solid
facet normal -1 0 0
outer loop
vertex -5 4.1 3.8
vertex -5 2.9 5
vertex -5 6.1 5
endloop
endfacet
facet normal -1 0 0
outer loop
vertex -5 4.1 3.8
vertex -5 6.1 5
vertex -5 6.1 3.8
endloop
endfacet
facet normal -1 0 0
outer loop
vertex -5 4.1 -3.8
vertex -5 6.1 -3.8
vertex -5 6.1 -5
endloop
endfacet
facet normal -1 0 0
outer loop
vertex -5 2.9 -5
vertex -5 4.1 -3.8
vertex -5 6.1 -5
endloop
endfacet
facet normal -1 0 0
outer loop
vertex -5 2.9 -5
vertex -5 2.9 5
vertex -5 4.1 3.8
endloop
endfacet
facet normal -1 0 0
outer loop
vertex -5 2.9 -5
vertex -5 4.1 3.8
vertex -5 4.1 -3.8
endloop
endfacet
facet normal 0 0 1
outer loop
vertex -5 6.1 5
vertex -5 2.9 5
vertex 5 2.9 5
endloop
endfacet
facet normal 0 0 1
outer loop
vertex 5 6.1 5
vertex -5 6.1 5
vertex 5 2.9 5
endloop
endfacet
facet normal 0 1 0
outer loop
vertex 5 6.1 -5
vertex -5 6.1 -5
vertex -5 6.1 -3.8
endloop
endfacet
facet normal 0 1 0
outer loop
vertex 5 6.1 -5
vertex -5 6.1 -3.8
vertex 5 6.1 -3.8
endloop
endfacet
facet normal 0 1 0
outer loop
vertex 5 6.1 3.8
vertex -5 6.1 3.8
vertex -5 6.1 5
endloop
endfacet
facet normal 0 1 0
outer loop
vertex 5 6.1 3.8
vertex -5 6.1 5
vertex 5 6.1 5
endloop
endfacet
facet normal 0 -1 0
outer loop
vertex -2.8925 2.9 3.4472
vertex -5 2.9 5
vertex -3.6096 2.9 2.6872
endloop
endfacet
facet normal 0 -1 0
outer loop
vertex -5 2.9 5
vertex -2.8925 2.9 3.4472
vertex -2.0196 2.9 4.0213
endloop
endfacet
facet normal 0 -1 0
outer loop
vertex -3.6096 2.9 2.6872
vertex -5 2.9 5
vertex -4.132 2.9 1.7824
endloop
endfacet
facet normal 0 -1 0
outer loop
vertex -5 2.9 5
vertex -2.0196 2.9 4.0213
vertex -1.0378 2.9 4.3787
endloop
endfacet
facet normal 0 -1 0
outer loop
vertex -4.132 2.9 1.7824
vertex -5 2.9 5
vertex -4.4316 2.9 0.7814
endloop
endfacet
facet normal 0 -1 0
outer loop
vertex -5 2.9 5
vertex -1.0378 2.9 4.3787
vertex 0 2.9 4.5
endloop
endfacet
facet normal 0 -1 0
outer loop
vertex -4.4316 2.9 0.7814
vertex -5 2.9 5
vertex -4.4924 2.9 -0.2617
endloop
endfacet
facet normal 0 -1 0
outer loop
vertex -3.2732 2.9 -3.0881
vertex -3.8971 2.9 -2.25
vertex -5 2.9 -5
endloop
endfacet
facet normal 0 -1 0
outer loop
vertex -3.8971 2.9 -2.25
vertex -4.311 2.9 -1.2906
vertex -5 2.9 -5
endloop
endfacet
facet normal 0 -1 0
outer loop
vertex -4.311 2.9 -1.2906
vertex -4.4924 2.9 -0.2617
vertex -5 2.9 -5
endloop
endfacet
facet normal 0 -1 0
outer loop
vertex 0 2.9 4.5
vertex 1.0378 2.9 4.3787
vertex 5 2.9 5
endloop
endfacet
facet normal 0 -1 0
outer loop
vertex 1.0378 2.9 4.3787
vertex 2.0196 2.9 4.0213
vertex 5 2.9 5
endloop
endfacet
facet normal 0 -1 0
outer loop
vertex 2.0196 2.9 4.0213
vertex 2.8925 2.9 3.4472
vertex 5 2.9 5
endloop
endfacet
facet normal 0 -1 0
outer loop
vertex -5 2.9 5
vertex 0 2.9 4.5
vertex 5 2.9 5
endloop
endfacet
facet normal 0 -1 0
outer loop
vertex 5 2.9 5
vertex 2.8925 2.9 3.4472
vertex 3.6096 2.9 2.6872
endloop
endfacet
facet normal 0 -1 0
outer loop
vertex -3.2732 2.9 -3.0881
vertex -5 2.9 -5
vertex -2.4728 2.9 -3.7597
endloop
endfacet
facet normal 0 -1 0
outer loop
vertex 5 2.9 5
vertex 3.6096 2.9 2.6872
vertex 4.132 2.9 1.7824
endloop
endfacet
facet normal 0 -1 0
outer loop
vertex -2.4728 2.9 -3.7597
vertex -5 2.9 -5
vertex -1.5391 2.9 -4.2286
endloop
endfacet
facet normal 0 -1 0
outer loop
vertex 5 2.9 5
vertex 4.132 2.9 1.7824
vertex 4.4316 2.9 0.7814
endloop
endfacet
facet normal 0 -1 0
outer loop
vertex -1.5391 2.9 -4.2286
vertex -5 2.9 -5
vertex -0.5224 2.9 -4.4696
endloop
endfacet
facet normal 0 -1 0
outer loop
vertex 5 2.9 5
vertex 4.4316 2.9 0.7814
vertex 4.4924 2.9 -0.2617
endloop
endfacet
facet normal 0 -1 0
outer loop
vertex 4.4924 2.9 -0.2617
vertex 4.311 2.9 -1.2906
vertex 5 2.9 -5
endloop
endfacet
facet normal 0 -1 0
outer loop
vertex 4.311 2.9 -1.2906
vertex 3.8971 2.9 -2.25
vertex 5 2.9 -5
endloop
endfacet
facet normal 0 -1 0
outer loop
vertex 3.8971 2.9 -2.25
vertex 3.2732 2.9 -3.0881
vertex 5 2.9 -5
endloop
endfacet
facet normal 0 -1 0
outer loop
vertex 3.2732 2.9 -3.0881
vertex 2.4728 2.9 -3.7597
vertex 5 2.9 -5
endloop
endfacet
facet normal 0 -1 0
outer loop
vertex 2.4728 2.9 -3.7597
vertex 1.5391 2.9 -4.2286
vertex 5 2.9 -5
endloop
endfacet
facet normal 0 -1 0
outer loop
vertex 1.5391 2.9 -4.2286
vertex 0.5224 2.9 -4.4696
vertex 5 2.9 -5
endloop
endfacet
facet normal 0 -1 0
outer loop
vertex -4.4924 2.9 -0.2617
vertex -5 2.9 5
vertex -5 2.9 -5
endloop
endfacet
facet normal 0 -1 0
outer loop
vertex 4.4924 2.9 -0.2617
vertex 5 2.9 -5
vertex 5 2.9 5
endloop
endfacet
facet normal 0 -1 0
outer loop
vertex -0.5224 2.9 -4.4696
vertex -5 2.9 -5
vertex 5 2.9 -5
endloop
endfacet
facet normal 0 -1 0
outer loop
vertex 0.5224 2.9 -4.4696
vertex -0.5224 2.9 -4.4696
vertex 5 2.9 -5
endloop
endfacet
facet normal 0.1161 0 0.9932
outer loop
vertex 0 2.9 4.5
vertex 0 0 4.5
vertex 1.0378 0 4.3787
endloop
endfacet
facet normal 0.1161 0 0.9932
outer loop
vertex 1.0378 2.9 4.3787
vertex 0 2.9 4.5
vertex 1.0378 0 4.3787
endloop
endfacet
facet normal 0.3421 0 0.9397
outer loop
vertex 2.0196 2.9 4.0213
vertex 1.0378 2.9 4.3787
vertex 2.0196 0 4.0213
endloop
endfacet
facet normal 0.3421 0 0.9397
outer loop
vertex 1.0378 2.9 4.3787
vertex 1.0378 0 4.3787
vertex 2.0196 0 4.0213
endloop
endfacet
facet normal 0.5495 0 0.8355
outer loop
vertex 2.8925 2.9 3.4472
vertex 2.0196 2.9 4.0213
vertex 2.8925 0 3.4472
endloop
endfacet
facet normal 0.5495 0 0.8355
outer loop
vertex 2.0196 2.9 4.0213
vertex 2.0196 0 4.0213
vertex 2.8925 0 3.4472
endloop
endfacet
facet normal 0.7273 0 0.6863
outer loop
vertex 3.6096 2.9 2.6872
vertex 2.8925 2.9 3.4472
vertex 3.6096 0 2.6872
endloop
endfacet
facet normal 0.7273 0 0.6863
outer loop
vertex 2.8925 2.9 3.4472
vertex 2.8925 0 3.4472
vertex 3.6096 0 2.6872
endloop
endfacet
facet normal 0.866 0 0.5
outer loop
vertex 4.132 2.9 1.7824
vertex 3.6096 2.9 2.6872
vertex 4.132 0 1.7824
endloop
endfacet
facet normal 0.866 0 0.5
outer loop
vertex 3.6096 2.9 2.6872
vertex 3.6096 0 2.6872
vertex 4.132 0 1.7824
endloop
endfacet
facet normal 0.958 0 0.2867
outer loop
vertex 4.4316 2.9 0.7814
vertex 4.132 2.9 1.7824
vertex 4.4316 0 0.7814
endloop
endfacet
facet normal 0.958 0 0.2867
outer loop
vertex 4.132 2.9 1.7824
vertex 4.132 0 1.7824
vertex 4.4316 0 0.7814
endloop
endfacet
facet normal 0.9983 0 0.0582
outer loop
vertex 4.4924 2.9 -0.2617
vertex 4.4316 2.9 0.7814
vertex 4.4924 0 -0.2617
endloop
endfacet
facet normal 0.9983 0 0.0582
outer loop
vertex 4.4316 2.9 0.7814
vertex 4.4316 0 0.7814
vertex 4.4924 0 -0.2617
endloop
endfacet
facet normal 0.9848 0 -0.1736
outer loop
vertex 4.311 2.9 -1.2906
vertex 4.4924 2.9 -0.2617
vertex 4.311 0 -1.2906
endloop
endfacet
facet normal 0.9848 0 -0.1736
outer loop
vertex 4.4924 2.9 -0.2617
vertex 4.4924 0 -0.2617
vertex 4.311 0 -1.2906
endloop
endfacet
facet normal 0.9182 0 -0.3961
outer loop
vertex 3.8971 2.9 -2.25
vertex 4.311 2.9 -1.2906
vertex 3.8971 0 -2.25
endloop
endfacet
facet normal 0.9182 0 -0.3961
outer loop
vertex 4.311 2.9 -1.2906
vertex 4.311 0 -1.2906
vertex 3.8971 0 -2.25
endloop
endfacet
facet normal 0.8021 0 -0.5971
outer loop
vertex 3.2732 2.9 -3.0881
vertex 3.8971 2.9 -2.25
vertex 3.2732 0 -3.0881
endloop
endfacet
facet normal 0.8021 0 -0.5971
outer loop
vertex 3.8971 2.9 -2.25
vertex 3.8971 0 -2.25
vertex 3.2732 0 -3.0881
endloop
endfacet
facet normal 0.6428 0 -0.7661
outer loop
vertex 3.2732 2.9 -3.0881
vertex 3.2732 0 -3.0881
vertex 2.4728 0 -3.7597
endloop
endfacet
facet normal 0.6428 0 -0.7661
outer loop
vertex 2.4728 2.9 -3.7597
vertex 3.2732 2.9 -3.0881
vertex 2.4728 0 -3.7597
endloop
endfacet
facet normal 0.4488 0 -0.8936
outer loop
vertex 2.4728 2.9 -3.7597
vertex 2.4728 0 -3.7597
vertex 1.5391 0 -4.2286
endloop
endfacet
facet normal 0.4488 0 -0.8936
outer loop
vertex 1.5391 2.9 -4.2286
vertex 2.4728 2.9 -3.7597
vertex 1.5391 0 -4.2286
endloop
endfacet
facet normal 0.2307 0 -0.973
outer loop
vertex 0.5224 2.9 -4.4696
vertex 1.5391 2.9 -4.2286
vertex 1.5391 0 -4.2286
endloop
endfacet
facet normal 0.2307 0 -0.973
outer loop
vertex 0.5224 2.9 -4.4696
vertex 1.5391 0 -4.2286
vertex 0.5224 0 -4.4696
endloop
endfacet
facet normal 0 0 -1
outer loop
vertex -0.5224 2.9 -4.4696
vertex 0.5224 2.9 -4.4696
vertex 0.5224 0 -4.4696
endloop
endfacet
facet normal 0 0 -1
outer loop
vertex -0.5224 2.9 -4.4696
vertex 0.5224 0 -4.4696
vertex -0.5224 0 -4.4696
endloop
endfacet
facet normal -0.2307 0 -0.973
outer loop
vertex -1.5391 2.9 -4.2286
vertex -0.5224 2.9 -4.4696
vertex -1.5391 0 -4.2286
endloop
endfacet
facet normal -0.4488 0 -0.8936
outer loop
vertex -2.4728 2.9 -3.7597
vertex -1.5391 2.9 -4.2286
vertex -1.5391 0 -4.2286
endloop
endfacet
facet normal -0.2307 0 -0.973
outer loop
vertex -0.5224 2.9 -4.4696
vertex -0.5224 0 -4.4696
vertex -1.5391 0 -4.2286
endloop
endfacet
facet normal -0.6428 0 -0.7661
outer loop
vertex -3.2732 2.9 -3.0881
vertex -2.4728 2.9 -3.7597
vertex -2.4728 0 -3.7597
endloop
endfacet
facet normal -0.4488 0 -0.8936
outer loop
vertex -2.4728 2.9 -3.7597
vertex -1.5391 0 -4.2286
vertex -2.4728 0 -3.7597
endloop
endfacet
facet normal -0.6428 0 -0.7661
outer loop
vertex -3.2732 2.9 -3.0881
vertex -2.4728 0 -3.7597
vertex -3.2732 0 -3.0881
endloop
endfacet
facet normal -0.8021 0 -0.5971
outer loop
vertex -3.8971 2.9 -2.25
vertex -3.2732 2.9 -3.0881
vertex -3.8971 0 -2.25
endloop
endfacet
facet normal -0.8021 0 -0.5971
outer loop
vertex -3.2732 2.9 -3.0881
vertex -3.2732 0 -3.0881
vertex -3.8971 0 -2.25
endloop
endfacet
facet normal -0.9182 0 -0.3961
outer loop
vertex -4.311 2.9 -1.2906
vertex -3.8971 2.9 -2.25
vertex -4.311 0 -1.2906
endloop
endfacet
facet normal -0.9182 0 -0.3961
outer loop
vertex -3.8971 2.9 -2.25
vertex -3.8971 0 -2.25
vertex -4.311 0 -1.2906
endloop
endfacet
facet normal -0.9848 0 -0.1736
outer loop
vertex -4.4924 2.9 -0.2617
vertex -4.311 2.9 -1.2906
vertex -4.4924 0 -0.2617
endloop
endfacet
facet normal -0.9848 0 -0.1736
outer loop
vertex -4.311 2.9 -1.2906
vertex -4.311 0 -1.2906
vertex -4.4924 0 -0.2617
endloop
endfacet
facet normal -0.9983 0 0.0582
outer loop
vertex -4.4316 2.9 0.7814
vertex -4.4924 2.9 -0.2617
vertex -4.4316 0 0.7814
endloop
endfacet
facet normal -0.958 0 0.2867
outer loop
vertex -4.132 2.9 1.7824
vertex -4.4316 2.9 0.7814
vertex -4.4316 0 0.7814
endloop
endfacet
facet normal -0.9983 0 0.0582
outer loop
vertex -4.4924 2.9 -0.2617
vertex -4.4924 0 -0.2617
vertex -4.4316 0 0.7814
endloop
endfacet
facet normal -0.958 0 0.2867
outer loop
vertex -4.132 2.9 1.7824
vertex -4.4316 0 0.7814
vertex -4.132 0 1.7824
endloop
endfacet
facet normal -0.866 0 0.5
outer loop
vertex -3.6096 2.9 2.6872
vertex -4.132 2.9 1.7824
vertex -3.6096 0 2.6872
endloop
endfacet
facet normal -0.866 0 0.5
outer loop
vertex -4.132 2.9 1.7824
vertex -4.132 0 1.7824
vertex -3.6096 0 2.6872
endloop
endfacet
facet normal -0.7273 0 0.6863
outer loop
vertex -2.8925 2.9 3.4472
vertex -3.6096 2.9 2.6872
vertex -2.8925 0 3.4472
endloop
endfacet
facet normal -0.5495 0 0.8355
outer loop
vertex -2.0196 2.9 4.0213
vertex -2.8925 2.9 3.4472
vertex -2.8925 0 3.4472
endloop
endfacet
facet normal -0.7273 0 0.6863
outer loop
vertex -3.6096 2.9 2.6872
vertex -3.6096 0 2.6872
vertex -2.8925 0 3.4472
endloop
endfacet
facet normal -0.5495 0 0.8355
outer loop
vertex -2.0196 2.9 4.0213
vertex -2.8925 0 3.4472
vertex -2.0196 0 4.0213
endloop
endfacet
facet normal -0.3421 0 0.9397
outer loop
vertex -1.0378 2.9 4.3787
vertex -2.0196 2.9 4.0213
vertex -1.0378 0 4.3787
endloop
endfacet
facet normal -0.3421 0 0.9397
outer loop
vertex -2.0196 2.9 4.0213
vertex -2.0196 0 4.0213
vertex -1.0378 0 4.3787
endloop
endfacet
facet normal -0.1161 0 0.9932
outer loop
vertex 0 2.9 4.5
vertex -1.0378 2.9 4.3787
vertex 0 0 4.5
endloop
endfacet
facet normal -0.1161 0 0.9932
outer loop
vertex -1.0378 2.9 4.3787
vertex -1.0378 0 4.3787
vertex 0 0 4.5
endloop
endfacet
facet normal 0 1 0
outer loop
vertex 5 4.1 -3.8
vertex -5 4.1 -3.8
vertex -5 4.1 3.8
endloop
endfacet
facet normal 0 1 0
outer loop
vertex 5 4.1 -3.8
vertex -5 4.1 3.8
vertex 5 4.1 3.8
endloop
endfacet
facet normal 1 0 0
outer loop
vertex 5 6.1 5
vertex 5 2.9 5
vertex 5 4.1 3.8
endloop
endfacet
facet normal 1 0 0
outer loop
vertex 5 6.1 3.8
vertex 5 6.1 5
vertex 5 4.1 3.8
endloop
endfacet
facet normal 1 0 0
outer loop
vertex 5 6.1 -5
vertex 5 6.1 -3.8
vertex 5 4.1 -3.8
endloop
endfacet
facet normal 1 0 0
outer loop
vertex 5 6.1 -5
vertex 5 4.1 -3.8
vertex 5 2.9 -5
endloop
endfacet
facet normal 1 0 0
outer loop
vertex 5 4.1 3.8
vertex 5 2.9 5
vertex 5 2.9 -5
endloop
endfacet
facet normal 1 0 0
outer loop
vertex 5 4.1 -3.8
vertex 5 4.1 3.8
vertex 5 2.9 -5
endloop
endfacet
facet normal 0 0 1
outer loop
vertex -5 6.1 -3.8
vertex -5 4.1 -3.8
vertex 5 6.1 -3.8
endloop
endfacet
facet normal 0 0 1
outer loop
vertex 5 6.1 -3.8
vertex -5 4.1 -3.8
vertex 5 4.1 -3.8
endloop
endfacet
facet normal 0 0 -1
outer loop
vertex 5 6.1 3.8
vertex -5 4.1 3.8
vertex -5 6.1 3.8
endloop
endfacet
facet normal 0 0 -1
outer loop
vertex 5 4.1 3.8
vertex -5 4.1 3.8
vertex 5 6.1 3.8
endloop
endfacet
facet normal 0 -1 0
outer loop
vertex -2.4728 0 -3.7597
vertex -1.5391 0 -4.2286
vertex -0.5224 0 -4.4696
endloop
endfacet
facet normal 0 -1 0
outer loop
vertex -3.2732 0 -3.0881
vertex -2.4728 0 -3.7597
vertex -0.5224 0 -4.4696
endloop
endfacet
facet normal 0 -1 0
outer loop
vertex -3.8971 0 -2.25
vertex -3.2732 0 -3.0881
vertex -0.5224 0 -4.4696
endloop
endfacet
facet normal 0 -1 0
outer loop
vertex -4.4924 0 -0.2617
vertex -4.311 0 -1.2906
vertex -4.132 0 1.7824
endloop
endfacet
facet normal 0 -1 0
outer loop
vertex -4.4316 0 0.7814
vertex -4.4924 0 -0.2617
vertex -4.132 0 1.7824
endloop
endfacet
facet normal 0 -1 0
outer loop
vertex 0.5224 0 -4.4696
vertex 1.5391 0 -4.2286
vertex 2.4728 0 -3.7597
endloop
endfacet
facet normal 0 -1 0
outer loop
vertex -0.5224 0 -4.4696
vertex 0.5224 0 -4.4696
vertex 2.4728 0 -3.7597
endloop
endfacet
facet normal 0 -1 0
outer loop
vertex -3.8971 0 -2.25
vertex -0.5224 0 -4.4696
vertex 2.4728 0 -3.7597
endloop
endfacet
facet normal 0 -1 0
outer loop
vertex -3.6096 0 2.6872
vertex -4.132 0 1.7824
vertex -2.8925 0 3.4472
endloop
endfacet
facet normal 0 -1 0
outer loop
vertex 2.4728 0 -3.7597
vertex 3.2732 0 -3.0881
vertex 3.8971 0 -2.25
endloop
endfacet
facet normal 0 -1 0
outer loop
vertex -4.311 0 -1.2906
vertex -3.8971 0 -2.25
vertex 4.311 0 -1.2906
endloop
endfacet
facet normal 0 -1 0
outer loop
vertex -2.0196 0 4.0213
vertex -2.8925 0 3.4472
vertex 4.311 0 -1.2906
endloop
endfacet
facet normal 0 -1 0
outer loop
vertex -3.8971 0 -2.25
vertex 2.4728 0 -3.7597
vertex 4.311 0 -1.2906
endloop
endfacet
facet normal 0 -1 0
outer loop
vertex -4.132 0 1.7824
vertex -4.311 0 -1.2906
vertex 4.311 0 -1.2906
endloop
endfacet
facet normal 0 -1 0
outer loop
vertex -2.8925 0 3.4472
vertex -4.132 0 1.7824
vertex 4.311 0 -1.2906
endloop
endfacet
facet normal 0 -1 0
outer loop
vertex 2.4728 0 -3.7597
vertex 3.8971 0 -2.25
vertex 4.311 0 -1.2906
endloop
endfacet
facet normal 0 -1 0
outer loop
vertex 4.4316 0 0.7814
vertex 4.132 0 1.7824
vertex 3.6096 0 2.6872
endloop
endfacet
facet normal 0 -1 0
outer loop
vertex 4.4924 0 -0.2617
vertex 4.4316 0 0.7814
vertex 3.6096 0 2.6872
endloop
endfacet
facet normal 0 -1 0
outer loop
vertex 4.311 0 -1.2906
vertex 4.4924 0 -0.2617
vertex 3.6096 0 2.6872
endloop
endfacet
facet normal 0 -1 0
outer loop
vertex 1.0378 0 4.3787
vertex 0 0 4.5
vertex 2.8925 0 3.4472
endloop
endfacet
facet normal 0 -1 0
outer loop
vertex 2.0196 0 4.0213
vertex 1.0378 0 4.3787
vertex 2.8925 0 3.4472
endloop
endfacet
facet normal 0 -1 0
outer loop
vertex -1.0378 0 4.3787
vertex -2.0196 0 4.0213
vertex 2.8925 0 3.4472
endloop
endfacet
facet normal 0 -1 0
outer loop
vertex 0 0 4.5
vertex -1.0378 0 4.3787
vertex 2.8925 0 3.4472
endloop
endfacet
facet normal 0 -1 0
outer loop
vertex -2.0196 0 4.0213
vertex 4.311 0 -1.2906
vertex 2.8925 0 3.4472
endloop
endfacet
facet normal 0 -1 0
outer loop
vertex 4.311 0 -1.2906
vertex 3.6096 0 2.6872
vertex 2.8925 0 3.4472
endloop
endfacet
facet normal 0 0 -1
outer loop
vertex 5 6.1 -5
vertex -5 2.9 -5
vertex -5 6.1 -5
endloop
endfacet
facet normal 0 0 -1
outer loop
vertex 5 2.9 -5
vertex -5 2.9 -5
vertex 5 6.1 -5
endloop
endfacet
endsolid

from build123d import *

# Parameters (mm, degrees)
ESQUISSE1_R        = 4.5
BOSS_EXTRU_1_DEPTH = 2.9
ESQUISSE2_W        = 10
ESQUISSE2_H        = 10
BOSS_EXTRU_2_DEPTH = 1.2
ESQUISSE3_W        = 10
ESQUISSE3_H        = 1.2
BOSS_EXTRU_3_DEPTH = 2


with BuildPart() as part:
    # Esquisse1 → Boss.-Extru.1 (new body)
    with BuildSketch(Plane(origin=(0, 0, 0), x_dir=(1, 0, 0), z_dir=(0, 1, 0))):
        with Locations(Location((0, 0, 0), (0, 0, 270))):
            Circle(ESQUISSE1_R)
    extrude(amount=BOSS_EXTRU_1_DEPTH)

    # Esquisse2 → Boss.-Extru.2 (add)
    with BuildSketch(Plane(origin=(0, 2.9, 0), x_dir=(1, 0, 0), z_dir=(0, 1, 0))):
        Rectangle(ESQUISSE2_W, ESQUISSE2_H)
    extrude(amount=BOSS_EXTRU_2_DEPTH)

    # Esquisse3 → Boss.-Extru.3 (add)
    with BuildSketch(Plane(origin=(0, 4.1, 0), x_dir=(1, 0, 0), z_dir=(0, 1, 0))):
        with Locations((0, 4.4)):
            Rectangle(ESQUISSE3_W, ESQUISSE3_H)
        with Locations((0, -4.4)):
            Rectangle(ESQUISSE3_W, ESQUISSE3_H)
    extrude(amount=BOSS_EXTRU_3_DEPTH)


solid = part.part
